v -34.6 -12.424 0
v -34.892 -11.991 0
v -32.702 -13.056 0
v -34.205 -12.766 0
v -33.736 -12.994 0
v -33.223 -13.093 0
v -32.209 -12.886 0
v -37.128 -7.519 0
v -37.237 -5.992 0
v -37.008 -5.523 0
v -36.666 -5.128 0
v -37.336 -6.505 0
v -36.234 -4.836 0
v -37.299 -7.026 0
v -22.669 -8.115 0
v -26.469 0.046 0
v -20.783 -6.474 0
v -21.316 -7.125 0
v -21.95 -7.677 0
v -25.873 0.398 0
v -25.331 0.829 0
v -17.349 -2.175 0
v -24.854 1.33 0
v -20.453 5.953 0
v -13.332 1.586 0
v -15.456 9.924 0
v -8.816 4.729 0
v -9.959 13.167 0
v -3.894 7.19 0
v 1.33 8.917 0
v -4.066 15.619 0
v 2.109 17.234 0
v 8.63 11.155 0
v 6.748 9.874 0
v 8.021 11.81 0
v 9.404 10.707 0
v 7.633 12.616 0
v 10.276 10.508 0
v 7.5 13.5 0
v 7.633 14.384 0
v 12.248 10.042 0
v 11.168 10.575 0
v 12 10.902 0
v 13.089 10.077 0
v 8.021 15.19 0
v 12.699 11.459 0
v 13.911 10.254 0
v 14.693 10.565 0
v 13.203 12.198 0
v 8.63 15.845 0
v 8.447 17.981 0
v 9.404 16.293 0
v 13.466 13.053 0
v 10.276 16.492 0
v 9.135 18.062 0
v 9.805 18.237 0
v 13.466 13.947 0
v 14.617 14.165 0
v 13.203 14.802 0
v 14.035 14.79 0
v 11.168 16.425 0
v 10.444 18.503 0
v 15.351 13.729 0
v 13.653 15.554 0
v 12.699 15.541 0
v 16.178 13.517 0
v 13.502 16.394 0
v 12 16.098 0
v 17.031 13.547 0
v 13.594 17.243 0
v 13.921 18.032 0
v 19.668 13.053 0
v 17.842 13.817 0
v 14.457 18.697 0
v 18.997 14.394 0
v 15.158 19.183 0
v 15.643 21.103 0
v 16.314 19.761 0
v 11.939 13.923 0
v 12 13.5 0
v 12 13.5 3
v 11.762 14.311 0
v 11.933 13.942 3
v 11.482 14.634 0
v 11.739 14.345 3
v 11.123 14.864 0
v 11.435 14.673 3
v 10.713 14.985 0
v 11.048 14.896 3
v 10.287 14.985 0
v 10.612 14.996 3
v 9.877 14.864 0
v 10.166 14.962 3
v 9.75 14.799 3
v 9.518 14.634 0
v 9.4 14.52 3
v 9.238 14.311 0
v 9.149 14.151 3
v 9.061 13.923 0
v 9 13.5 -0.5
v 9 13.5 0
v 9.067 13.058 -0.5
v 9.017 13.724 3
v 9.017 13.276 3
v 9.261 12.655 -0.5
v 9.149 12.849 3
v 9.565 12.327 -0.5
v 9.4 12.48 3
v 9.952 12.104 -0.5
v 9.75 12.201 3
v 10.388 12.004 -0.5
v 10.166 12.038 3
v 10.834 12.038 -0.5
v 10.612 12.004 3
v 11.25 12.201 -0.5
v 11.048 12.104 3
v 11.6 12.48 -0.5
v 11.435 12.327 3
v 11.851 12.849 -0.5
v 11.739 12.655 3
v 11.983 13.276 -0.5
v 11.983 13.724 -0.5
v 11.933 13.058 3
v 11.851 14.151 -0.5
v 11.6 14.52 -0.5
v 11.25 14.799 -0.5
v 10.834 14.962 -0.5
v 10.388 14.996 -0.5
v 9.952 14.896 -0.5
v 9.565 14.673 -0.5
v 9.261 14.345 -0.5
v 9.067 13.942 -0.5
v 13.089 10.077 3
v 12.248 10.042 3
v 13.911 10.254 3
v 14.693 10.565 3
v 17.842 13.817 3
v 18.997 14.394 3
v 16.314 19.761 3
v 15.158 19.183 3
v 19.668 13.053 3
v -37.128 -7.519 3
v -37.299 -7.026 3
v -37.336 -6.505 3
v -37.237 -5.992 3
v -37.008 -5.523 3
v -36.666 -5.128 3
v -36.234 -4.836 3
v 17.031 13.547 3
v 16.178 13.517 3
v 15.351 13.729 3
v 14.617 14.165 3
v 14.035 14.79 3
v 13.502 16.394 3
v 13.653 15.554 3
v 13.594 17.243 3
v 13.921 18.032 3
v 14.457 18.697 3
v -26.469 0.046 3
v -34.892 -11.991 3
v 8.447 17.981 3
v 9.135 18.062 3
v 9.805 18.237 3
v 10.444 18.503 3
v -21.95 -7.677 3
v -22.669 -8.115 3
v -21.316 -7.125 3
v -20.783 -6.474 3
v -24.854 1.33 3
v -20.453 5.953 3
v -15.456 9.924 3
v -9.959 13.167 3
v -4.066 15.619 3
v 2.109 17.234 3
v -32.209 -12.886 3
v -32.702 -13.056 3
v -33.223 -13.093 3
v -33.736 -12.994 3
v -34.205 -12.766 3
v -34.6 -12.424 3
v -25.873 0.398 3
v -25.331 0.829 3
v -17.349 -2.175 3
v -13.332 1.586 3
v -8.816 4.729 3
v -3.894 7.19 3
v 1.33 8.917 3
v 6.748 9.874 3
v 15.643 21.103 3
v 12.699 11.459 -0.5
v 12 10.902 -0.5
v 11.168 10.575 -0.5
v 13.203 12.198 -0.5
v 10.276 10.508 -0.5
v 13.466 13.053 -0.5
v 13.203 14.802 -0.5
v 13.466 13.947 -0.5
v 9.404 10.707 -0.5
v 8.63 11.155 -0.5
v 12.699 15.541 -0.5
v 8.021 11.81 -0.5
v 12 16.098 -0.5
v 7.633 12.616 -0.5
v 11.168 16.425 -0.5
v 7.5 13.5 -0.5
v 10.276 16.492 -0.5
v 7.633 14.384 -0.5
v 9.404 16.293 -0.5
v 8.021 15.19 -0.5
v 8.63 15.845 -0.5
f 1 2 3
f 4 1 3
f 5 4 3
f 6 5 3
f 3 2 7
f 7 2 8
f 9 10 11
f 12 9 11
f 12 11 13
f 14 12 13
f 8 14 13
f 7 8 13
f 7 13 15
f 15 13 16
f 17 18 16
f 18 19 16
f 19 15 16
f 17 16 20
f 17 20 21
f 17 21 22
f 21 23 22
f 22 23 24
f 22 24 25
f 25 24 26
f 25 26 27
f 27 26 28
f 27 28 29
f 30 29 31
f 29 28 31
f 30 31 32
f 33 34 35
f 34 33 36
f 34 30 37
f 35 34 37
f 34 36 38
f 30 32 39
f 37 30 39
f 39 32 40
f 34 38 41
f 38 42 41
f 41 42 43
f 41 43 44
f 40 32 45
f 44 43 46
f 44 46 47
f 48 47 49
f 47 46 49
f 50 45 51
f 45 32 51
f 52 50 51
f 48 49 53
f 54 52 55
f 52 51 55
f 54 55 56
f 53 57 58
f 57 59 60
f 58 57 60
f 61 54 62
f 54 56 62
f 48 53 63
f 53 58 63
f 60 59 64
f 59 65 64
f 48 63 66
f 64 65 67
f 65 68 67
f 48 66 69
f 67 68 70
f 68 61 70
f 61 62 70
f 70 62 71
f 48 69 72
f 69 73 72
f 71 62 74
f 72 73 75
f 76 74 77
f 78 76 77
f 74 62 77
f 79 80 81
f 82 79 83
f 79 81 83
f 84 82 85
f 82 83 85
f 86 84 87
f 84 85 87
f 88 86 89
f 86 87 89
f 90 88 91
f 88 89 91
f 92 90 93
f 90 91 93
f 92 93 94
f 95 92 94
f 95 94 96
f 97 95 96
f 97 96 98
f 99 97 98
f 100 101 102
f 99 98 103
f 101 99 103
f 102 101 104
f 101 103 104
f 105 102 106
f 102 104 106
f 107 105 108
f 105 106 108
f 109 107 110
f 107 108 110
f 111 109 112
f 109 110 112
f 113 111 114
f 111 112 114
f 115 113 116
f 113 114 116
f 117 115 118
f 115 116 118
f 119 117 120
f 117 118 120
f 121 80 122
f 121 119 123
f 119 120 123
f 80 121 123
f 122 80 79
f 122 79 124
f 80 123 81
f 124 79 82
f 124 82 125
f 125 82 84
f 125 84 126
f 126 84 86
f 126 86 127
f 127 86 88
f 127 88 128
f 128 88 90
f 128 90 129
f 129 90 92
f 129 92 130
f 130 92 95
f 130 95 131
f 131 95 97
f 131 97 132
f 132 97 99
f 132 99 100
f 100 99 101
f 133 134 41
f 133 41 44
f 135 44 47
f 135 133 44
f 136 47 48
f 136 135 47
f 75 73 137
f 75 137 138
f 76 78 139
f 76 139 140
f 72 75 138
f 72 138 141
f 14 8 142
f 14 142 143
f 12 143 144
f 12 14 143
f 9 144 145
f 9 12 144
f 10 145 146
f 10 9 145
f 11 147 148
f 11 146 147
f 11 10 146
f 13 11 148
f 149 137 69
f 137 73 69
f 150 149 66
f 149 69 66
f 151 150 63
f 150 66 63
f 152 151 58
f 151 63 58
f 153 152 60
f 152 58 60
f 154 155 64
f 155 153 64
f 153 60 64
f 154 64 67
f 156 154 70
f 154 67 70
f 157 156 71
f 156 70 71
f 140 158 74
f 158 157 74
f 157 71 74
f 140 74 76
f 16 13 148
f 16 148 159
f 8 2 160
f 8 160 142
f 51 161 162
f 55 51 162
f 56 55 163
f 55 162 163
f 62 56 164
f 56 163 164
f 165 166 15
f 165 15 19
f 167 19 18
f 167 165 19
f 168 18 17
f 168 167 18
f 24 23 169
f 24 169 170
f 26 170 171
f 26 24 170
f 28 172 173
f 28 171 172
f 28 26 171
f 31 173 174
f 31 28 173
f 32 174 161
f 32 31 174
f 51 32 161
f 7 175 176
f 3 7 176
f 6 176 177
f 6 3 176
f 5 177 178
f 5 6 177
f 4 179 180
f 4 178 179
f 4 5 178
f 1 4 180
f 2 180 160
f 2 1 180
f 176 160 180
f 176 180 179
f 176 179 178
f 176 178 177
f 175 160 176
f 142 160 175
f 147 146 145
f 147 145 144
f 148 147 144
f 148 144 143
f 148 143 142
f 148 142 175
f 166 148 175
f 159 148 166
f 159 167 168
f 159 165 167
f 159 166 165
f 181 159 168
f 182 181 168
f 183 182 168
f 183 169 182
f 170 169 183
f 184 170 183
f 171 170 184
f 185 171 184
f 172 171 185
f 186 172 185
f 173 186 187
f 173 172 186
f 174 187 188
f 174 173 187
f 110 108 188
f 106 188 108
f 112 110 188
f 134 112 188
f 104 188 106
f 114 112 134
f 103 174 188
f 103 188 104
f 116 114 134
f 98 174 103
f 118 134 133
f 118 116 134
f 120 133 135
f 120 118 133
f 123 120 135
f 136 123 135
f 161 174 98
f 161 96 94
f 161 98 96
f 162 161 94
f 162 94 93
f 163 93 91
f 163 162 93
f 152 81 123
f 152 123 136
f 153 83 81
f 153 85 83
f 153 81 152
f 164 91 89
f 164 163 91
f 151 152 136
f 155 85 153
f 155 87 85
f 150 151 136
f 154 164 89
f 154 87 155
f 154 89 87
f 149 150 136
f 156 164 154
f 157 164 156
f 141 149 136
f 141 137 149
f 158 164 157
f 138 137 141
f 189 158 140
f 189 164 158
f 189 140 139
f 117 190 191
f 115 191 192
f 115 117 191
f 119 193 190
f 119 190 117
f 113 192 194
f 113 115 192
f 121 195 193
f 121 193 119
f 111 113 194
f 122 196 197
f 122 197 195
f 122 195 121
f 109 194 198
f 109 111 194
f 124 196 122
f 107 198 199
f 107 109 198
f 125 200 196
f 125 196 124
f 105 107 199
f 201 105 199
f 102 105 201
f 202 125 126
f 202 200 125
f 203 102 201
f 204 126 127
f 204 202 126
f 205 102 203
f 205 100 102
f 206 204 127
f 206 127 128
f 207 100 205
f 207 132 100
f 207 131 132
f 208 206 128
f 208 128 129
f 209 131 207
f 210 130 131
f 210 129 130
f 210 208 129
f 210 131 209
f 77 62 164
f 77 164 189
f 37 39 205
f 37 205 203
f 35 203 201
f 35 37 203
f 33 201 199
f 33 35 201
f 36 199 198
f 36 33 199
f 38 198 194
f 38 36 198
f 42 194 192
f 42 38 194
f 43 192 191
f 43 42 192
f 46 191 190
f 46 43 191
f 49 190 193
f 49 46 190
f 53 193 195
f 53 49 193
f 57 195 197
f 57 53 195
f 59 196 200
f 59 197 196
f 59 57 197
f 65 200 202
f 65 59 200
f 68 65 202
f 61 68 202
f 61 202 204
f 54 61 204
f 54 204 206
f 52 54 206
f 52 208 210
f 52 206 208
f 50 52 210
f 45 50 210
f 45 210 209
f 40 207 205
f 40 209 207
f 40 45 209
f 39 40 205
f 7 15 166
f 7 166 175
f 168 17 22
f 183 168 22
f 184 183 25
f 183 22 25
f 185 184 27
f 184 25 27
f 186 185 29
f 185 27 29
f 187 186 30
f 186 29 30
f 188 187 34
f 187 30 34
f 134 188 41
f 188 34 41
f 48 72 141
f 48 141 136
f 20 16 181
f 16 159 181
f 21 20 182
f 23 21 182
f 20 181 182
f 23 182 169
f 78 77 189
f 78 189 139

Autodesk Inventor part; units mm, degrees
ref_plane "YZ Plane" through (0, 0, 0) normal (1, 0, 0) x (0, 1, 0)
ref_plane "XZ Plane" through (0, 0, 0) normal (0, 1, 0) x (-1, 0, 0)
ref_plane "XY Plane" through (0, 0, 0) normal (0, 0, 1) x (1, 0, 0)
ref_plane "Work Plane1" through (0, 0, 0) normal (0, 0, 1) x (1, 0, 0)
sketch "Sketch1" plane through (0, 0, 0) normal (0, 0, 1) x (1, 0, 0)
  arc A0 (-15, -23) -> (-13.6245, -24.9) centre (-13, -23) ccw projected
  line L0 (-13.6245, -24.9) -> (13.6245, -24.9) projected
  arc A1 (13.6245, -24.9) -> (15, -23) centre (13, -23) ccw projected
  line L1 (15, -23) -> (15, 23) projected
  arc A2 (15, 23) -> (13.6245, 24.9) centre (13, 23) ccw projected
  line L2 (13.6245, 24.9) -> (-13.6245, 24.9) projected
  arc A3 (-13.6245, 24.9) -> (-15, 23) centre (-13, 23) ccw projected
  line L3 (-15, 23) -> (-15, -23) projected
  circle A4 centre (10.5, 13.5) radius 1.4 construction
  circle A5 centre (16.5, 16.5) radius 2.45 projected
  line L4 (-36.2338, -4.8358) -> (15.643, 21.1026)
  line L5 (15.643, 21.1026) -> (19.6679, 13.0528)
  line L6 (19.6679, 13.0528) -> (-32.2089, -12.8856)
  line L7 (-34.8922, -11.9912) -> (-37.1282, -7.519)
  line L8 (-38.0227, -5.7302) -> (19.6679, 13.0528) construction
  line L9 (15.643, 21.1026) -> (-33.9978, -13.78) construction
  line L10 (16.5, 16.5) -> (10.5, 13.5)
  line L11 (16.5, 16.5) -> (19.9213, 18.2106) construction
  line L12 (17.8416, 13.8167) -> (21.2629, 15.5274)
  line L13 (18.5797, 20.8939) -> (15.1584, 19.1833)
  arc A6 (15.1584, 19.1833) -> (17.8416, 13.8167) centre (16.5, 16.5) ccw
  arc A7 (21.2629, 15.5274) -> (18.5797, 20.8939) centre (19.9213, 18.2106) ccw
  arc A8 (-34.8922, -11.9912) -> (-32.2089, -12.8856) centre (-33.1033, -11.0967) ccw
  arc A9 (-36.2338, -4.8358) -> (-37.1282, -7.519) centre (-35.3394, -6.6246) ccw
  circle A10 centre (10.5, 13.5) radius 1.5
  arc A11 (13.5, 9.9688) -> (-21.4758, -7.519) centre (10.6575, -28.0659) ccw
  arc A12 (9.4751, 18.0187) -> (-25.5007, 0.5308) centre (10.6575, -28.0659) ccw
  circle A13 centre (0, -18.9) radius 1.4 projected
  point P0 (0, 0)
  point P1 (-9.1774, 3.6613)
  point P2 (18.2106, 17.3553)
  point P3 (16.3138, 19.761)
  point P4 (18.9971, 14.3944)
  dimension "d0" = 60
  dimension "d1" = 9
  dimension "d2" = 4.5
  dimension "d3" = 8
  dimension "d4" = 6
  dimension "d5" = 2
  dimension "d8" = 3
  dimension "d9" = 14
  dimension "d10" = 14
extrude "Extrusion1" add sketch "Sketch1" along normal blind 3 contours A11 L6 A8 L7 A9 L4 L3 | L3 L4 L1 A6 L6 A11 | L4 A12 L3 | L3 A12 L4 | L1 A6 L12 L5 L6 | L4 L5 L13 A6 L1
fillet "Fillet1" radius 5 4 edges at (-25.5007, 0.5308, 1.5) (-21.4758, -7.519, 1.5) (9.4751, 18.0187, 1.5) (13.5, 9.9688, 1.5)
sketch "Sketch2" plane through (0, 0, 0) normal (0, 0, -1) x (-1, 0, 0)
  circle A0 centre (-10.5, 13.5) radius 1.1933 projected
  circle A1 centre (-10.5, 13.5) radius 1.5 projected
  circle A2 centre (-10.5, 13.5) radius 3
  point P0 (0, 0)
  dimension "d12" = 6
extrude "Extrusion2" add sketch "Sketch2" along normal blind 0.5 contours A2
properties part number "20_Cube_4_insert_xy_levelarm"
